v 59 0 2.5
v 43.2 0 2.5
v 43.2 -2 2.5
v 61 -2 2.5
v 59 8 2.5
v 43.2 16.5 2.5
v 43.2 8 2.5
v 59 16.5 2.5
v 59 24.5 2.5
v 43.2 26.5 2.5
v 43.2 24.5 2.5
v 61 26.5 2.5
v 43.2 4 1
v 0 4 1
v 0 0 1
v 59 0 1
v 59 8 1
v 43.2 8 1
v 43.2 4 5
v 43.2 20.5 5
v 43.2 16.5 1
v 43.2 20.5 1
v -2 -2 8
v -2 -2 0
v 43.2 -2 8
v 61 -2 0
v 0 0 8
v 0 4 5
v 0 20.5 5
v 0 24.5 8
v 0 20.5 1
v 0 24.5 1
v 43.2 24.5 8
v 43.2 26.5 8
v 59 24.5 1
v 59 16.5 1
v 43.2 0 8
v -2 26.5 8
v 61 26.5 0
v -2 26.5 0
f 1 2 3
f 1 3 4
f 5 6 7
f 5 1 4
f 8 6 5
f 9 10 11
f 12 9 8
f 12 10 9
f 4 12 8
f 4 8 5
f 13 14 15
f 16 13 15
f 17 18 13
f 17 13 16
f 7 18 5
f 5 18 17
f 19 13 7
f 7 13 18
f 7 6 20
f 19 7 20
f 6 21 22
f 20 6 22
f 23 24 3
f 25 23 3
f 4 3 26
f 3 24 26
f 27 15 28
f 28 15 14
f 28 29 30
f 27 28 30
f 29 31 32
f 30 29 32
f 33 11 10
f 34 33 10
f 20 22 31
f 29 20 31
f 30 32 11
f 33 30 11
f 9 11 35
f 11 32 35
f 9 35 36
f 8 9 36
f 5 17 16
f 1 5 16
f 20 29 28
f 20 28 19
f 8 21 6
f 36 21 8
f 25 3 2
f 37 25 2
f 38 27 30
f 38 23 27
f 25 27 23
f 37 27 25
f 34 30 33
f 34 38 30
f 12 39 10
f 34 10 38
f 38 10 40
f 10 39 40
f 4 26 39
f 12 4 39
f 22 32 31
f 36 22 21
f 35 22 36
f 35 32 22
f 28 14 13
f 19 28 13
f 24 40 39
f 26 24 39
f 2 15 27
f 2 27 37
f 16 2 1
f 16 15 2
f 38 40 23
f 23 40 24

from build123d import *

# Parameters (mm, degrees)
F0_W     = 43.2
F0_H     = 4
F1_DEPTH = 1
F0_W_2   = 15.8
F0_H_2   = 2
F0_H_3   = 8.5
F2_DEPTH = 2.5
F3_DEPTH = 5
F4_DEPTH = 8


with BuildPart() as f1:
    # F0 (on Top) → F1 (new body)
    with BuildSketch(Plane.XY):
        Polygon((59, 16.5), (59, 24.5), (43.2, 24.5), (43.2, 20.5), (43.2, 16.5), align=None)
        with Locations((21.6, 22.5)):
            Rectangle(F0_W, F0_H)
    extrude(amount=F1_DEPTH)



with BuildPart() as f1b:
    # F0 (on Top) → F1, piece 2 (new body)
    with BuildSketch(Plane.XY):
        Polygon((59, 0), (59, 8), (43.2, 8), (43.2, 4), (43.2, 0), align=None)
        with Locations((21.6, 2)):
            Rectangle(F0_W, F0_H)
    extrude(amount=F1_DEPTH)


with BuildPart() as f1_1:
    add(f1.part)

    add(f1b.part)  # F2 merges F1b
    # F0 (on Top) → F2 (join)
    with BuildSketch(Plane.XY):
        with Locations((51.1, 25.5)):
            Rectangle(F0_W_2, F0_H_2)
        with Locations((51.1, 12.25)):
            Rectangle(F0_W_2, F0_H_3)
        with Locations((51.1, -1)):
            Rectangle(F0_W_2, F0_H_2)
        Polygon((61, 26.5), (59, 26.5), (59, 24.5), (59, 16.5), (59, 8), (59, 0), (59, -2), (61, -2), align=None)
    extrude(amount=F2_DEPTH)

    # F0 (on Top) → F3 (join)
    with BuildSketch(Plane.XY):
        Polygon((43.2, 8), (43.2, 16.5), (43.2, 20.5), (0, 20.5), (0, 4), (43.2, 4), align=None)
    extrude(amount=F3_DEPTH)

    # F0 (on Top) → F4 (join)
    with BuildSketch(Plane.XY):
        Polygon((43.2, 24.5), (43.2, 26.5), (-2, 26.5), (-2, -2), (43.2, -2), (43.2, 0), (0, 0), (0, 4), (0, 20.5), (0, 24.5), align=None)
    extrude(amount=F4_DEPTH)


solid = f1_1.part
